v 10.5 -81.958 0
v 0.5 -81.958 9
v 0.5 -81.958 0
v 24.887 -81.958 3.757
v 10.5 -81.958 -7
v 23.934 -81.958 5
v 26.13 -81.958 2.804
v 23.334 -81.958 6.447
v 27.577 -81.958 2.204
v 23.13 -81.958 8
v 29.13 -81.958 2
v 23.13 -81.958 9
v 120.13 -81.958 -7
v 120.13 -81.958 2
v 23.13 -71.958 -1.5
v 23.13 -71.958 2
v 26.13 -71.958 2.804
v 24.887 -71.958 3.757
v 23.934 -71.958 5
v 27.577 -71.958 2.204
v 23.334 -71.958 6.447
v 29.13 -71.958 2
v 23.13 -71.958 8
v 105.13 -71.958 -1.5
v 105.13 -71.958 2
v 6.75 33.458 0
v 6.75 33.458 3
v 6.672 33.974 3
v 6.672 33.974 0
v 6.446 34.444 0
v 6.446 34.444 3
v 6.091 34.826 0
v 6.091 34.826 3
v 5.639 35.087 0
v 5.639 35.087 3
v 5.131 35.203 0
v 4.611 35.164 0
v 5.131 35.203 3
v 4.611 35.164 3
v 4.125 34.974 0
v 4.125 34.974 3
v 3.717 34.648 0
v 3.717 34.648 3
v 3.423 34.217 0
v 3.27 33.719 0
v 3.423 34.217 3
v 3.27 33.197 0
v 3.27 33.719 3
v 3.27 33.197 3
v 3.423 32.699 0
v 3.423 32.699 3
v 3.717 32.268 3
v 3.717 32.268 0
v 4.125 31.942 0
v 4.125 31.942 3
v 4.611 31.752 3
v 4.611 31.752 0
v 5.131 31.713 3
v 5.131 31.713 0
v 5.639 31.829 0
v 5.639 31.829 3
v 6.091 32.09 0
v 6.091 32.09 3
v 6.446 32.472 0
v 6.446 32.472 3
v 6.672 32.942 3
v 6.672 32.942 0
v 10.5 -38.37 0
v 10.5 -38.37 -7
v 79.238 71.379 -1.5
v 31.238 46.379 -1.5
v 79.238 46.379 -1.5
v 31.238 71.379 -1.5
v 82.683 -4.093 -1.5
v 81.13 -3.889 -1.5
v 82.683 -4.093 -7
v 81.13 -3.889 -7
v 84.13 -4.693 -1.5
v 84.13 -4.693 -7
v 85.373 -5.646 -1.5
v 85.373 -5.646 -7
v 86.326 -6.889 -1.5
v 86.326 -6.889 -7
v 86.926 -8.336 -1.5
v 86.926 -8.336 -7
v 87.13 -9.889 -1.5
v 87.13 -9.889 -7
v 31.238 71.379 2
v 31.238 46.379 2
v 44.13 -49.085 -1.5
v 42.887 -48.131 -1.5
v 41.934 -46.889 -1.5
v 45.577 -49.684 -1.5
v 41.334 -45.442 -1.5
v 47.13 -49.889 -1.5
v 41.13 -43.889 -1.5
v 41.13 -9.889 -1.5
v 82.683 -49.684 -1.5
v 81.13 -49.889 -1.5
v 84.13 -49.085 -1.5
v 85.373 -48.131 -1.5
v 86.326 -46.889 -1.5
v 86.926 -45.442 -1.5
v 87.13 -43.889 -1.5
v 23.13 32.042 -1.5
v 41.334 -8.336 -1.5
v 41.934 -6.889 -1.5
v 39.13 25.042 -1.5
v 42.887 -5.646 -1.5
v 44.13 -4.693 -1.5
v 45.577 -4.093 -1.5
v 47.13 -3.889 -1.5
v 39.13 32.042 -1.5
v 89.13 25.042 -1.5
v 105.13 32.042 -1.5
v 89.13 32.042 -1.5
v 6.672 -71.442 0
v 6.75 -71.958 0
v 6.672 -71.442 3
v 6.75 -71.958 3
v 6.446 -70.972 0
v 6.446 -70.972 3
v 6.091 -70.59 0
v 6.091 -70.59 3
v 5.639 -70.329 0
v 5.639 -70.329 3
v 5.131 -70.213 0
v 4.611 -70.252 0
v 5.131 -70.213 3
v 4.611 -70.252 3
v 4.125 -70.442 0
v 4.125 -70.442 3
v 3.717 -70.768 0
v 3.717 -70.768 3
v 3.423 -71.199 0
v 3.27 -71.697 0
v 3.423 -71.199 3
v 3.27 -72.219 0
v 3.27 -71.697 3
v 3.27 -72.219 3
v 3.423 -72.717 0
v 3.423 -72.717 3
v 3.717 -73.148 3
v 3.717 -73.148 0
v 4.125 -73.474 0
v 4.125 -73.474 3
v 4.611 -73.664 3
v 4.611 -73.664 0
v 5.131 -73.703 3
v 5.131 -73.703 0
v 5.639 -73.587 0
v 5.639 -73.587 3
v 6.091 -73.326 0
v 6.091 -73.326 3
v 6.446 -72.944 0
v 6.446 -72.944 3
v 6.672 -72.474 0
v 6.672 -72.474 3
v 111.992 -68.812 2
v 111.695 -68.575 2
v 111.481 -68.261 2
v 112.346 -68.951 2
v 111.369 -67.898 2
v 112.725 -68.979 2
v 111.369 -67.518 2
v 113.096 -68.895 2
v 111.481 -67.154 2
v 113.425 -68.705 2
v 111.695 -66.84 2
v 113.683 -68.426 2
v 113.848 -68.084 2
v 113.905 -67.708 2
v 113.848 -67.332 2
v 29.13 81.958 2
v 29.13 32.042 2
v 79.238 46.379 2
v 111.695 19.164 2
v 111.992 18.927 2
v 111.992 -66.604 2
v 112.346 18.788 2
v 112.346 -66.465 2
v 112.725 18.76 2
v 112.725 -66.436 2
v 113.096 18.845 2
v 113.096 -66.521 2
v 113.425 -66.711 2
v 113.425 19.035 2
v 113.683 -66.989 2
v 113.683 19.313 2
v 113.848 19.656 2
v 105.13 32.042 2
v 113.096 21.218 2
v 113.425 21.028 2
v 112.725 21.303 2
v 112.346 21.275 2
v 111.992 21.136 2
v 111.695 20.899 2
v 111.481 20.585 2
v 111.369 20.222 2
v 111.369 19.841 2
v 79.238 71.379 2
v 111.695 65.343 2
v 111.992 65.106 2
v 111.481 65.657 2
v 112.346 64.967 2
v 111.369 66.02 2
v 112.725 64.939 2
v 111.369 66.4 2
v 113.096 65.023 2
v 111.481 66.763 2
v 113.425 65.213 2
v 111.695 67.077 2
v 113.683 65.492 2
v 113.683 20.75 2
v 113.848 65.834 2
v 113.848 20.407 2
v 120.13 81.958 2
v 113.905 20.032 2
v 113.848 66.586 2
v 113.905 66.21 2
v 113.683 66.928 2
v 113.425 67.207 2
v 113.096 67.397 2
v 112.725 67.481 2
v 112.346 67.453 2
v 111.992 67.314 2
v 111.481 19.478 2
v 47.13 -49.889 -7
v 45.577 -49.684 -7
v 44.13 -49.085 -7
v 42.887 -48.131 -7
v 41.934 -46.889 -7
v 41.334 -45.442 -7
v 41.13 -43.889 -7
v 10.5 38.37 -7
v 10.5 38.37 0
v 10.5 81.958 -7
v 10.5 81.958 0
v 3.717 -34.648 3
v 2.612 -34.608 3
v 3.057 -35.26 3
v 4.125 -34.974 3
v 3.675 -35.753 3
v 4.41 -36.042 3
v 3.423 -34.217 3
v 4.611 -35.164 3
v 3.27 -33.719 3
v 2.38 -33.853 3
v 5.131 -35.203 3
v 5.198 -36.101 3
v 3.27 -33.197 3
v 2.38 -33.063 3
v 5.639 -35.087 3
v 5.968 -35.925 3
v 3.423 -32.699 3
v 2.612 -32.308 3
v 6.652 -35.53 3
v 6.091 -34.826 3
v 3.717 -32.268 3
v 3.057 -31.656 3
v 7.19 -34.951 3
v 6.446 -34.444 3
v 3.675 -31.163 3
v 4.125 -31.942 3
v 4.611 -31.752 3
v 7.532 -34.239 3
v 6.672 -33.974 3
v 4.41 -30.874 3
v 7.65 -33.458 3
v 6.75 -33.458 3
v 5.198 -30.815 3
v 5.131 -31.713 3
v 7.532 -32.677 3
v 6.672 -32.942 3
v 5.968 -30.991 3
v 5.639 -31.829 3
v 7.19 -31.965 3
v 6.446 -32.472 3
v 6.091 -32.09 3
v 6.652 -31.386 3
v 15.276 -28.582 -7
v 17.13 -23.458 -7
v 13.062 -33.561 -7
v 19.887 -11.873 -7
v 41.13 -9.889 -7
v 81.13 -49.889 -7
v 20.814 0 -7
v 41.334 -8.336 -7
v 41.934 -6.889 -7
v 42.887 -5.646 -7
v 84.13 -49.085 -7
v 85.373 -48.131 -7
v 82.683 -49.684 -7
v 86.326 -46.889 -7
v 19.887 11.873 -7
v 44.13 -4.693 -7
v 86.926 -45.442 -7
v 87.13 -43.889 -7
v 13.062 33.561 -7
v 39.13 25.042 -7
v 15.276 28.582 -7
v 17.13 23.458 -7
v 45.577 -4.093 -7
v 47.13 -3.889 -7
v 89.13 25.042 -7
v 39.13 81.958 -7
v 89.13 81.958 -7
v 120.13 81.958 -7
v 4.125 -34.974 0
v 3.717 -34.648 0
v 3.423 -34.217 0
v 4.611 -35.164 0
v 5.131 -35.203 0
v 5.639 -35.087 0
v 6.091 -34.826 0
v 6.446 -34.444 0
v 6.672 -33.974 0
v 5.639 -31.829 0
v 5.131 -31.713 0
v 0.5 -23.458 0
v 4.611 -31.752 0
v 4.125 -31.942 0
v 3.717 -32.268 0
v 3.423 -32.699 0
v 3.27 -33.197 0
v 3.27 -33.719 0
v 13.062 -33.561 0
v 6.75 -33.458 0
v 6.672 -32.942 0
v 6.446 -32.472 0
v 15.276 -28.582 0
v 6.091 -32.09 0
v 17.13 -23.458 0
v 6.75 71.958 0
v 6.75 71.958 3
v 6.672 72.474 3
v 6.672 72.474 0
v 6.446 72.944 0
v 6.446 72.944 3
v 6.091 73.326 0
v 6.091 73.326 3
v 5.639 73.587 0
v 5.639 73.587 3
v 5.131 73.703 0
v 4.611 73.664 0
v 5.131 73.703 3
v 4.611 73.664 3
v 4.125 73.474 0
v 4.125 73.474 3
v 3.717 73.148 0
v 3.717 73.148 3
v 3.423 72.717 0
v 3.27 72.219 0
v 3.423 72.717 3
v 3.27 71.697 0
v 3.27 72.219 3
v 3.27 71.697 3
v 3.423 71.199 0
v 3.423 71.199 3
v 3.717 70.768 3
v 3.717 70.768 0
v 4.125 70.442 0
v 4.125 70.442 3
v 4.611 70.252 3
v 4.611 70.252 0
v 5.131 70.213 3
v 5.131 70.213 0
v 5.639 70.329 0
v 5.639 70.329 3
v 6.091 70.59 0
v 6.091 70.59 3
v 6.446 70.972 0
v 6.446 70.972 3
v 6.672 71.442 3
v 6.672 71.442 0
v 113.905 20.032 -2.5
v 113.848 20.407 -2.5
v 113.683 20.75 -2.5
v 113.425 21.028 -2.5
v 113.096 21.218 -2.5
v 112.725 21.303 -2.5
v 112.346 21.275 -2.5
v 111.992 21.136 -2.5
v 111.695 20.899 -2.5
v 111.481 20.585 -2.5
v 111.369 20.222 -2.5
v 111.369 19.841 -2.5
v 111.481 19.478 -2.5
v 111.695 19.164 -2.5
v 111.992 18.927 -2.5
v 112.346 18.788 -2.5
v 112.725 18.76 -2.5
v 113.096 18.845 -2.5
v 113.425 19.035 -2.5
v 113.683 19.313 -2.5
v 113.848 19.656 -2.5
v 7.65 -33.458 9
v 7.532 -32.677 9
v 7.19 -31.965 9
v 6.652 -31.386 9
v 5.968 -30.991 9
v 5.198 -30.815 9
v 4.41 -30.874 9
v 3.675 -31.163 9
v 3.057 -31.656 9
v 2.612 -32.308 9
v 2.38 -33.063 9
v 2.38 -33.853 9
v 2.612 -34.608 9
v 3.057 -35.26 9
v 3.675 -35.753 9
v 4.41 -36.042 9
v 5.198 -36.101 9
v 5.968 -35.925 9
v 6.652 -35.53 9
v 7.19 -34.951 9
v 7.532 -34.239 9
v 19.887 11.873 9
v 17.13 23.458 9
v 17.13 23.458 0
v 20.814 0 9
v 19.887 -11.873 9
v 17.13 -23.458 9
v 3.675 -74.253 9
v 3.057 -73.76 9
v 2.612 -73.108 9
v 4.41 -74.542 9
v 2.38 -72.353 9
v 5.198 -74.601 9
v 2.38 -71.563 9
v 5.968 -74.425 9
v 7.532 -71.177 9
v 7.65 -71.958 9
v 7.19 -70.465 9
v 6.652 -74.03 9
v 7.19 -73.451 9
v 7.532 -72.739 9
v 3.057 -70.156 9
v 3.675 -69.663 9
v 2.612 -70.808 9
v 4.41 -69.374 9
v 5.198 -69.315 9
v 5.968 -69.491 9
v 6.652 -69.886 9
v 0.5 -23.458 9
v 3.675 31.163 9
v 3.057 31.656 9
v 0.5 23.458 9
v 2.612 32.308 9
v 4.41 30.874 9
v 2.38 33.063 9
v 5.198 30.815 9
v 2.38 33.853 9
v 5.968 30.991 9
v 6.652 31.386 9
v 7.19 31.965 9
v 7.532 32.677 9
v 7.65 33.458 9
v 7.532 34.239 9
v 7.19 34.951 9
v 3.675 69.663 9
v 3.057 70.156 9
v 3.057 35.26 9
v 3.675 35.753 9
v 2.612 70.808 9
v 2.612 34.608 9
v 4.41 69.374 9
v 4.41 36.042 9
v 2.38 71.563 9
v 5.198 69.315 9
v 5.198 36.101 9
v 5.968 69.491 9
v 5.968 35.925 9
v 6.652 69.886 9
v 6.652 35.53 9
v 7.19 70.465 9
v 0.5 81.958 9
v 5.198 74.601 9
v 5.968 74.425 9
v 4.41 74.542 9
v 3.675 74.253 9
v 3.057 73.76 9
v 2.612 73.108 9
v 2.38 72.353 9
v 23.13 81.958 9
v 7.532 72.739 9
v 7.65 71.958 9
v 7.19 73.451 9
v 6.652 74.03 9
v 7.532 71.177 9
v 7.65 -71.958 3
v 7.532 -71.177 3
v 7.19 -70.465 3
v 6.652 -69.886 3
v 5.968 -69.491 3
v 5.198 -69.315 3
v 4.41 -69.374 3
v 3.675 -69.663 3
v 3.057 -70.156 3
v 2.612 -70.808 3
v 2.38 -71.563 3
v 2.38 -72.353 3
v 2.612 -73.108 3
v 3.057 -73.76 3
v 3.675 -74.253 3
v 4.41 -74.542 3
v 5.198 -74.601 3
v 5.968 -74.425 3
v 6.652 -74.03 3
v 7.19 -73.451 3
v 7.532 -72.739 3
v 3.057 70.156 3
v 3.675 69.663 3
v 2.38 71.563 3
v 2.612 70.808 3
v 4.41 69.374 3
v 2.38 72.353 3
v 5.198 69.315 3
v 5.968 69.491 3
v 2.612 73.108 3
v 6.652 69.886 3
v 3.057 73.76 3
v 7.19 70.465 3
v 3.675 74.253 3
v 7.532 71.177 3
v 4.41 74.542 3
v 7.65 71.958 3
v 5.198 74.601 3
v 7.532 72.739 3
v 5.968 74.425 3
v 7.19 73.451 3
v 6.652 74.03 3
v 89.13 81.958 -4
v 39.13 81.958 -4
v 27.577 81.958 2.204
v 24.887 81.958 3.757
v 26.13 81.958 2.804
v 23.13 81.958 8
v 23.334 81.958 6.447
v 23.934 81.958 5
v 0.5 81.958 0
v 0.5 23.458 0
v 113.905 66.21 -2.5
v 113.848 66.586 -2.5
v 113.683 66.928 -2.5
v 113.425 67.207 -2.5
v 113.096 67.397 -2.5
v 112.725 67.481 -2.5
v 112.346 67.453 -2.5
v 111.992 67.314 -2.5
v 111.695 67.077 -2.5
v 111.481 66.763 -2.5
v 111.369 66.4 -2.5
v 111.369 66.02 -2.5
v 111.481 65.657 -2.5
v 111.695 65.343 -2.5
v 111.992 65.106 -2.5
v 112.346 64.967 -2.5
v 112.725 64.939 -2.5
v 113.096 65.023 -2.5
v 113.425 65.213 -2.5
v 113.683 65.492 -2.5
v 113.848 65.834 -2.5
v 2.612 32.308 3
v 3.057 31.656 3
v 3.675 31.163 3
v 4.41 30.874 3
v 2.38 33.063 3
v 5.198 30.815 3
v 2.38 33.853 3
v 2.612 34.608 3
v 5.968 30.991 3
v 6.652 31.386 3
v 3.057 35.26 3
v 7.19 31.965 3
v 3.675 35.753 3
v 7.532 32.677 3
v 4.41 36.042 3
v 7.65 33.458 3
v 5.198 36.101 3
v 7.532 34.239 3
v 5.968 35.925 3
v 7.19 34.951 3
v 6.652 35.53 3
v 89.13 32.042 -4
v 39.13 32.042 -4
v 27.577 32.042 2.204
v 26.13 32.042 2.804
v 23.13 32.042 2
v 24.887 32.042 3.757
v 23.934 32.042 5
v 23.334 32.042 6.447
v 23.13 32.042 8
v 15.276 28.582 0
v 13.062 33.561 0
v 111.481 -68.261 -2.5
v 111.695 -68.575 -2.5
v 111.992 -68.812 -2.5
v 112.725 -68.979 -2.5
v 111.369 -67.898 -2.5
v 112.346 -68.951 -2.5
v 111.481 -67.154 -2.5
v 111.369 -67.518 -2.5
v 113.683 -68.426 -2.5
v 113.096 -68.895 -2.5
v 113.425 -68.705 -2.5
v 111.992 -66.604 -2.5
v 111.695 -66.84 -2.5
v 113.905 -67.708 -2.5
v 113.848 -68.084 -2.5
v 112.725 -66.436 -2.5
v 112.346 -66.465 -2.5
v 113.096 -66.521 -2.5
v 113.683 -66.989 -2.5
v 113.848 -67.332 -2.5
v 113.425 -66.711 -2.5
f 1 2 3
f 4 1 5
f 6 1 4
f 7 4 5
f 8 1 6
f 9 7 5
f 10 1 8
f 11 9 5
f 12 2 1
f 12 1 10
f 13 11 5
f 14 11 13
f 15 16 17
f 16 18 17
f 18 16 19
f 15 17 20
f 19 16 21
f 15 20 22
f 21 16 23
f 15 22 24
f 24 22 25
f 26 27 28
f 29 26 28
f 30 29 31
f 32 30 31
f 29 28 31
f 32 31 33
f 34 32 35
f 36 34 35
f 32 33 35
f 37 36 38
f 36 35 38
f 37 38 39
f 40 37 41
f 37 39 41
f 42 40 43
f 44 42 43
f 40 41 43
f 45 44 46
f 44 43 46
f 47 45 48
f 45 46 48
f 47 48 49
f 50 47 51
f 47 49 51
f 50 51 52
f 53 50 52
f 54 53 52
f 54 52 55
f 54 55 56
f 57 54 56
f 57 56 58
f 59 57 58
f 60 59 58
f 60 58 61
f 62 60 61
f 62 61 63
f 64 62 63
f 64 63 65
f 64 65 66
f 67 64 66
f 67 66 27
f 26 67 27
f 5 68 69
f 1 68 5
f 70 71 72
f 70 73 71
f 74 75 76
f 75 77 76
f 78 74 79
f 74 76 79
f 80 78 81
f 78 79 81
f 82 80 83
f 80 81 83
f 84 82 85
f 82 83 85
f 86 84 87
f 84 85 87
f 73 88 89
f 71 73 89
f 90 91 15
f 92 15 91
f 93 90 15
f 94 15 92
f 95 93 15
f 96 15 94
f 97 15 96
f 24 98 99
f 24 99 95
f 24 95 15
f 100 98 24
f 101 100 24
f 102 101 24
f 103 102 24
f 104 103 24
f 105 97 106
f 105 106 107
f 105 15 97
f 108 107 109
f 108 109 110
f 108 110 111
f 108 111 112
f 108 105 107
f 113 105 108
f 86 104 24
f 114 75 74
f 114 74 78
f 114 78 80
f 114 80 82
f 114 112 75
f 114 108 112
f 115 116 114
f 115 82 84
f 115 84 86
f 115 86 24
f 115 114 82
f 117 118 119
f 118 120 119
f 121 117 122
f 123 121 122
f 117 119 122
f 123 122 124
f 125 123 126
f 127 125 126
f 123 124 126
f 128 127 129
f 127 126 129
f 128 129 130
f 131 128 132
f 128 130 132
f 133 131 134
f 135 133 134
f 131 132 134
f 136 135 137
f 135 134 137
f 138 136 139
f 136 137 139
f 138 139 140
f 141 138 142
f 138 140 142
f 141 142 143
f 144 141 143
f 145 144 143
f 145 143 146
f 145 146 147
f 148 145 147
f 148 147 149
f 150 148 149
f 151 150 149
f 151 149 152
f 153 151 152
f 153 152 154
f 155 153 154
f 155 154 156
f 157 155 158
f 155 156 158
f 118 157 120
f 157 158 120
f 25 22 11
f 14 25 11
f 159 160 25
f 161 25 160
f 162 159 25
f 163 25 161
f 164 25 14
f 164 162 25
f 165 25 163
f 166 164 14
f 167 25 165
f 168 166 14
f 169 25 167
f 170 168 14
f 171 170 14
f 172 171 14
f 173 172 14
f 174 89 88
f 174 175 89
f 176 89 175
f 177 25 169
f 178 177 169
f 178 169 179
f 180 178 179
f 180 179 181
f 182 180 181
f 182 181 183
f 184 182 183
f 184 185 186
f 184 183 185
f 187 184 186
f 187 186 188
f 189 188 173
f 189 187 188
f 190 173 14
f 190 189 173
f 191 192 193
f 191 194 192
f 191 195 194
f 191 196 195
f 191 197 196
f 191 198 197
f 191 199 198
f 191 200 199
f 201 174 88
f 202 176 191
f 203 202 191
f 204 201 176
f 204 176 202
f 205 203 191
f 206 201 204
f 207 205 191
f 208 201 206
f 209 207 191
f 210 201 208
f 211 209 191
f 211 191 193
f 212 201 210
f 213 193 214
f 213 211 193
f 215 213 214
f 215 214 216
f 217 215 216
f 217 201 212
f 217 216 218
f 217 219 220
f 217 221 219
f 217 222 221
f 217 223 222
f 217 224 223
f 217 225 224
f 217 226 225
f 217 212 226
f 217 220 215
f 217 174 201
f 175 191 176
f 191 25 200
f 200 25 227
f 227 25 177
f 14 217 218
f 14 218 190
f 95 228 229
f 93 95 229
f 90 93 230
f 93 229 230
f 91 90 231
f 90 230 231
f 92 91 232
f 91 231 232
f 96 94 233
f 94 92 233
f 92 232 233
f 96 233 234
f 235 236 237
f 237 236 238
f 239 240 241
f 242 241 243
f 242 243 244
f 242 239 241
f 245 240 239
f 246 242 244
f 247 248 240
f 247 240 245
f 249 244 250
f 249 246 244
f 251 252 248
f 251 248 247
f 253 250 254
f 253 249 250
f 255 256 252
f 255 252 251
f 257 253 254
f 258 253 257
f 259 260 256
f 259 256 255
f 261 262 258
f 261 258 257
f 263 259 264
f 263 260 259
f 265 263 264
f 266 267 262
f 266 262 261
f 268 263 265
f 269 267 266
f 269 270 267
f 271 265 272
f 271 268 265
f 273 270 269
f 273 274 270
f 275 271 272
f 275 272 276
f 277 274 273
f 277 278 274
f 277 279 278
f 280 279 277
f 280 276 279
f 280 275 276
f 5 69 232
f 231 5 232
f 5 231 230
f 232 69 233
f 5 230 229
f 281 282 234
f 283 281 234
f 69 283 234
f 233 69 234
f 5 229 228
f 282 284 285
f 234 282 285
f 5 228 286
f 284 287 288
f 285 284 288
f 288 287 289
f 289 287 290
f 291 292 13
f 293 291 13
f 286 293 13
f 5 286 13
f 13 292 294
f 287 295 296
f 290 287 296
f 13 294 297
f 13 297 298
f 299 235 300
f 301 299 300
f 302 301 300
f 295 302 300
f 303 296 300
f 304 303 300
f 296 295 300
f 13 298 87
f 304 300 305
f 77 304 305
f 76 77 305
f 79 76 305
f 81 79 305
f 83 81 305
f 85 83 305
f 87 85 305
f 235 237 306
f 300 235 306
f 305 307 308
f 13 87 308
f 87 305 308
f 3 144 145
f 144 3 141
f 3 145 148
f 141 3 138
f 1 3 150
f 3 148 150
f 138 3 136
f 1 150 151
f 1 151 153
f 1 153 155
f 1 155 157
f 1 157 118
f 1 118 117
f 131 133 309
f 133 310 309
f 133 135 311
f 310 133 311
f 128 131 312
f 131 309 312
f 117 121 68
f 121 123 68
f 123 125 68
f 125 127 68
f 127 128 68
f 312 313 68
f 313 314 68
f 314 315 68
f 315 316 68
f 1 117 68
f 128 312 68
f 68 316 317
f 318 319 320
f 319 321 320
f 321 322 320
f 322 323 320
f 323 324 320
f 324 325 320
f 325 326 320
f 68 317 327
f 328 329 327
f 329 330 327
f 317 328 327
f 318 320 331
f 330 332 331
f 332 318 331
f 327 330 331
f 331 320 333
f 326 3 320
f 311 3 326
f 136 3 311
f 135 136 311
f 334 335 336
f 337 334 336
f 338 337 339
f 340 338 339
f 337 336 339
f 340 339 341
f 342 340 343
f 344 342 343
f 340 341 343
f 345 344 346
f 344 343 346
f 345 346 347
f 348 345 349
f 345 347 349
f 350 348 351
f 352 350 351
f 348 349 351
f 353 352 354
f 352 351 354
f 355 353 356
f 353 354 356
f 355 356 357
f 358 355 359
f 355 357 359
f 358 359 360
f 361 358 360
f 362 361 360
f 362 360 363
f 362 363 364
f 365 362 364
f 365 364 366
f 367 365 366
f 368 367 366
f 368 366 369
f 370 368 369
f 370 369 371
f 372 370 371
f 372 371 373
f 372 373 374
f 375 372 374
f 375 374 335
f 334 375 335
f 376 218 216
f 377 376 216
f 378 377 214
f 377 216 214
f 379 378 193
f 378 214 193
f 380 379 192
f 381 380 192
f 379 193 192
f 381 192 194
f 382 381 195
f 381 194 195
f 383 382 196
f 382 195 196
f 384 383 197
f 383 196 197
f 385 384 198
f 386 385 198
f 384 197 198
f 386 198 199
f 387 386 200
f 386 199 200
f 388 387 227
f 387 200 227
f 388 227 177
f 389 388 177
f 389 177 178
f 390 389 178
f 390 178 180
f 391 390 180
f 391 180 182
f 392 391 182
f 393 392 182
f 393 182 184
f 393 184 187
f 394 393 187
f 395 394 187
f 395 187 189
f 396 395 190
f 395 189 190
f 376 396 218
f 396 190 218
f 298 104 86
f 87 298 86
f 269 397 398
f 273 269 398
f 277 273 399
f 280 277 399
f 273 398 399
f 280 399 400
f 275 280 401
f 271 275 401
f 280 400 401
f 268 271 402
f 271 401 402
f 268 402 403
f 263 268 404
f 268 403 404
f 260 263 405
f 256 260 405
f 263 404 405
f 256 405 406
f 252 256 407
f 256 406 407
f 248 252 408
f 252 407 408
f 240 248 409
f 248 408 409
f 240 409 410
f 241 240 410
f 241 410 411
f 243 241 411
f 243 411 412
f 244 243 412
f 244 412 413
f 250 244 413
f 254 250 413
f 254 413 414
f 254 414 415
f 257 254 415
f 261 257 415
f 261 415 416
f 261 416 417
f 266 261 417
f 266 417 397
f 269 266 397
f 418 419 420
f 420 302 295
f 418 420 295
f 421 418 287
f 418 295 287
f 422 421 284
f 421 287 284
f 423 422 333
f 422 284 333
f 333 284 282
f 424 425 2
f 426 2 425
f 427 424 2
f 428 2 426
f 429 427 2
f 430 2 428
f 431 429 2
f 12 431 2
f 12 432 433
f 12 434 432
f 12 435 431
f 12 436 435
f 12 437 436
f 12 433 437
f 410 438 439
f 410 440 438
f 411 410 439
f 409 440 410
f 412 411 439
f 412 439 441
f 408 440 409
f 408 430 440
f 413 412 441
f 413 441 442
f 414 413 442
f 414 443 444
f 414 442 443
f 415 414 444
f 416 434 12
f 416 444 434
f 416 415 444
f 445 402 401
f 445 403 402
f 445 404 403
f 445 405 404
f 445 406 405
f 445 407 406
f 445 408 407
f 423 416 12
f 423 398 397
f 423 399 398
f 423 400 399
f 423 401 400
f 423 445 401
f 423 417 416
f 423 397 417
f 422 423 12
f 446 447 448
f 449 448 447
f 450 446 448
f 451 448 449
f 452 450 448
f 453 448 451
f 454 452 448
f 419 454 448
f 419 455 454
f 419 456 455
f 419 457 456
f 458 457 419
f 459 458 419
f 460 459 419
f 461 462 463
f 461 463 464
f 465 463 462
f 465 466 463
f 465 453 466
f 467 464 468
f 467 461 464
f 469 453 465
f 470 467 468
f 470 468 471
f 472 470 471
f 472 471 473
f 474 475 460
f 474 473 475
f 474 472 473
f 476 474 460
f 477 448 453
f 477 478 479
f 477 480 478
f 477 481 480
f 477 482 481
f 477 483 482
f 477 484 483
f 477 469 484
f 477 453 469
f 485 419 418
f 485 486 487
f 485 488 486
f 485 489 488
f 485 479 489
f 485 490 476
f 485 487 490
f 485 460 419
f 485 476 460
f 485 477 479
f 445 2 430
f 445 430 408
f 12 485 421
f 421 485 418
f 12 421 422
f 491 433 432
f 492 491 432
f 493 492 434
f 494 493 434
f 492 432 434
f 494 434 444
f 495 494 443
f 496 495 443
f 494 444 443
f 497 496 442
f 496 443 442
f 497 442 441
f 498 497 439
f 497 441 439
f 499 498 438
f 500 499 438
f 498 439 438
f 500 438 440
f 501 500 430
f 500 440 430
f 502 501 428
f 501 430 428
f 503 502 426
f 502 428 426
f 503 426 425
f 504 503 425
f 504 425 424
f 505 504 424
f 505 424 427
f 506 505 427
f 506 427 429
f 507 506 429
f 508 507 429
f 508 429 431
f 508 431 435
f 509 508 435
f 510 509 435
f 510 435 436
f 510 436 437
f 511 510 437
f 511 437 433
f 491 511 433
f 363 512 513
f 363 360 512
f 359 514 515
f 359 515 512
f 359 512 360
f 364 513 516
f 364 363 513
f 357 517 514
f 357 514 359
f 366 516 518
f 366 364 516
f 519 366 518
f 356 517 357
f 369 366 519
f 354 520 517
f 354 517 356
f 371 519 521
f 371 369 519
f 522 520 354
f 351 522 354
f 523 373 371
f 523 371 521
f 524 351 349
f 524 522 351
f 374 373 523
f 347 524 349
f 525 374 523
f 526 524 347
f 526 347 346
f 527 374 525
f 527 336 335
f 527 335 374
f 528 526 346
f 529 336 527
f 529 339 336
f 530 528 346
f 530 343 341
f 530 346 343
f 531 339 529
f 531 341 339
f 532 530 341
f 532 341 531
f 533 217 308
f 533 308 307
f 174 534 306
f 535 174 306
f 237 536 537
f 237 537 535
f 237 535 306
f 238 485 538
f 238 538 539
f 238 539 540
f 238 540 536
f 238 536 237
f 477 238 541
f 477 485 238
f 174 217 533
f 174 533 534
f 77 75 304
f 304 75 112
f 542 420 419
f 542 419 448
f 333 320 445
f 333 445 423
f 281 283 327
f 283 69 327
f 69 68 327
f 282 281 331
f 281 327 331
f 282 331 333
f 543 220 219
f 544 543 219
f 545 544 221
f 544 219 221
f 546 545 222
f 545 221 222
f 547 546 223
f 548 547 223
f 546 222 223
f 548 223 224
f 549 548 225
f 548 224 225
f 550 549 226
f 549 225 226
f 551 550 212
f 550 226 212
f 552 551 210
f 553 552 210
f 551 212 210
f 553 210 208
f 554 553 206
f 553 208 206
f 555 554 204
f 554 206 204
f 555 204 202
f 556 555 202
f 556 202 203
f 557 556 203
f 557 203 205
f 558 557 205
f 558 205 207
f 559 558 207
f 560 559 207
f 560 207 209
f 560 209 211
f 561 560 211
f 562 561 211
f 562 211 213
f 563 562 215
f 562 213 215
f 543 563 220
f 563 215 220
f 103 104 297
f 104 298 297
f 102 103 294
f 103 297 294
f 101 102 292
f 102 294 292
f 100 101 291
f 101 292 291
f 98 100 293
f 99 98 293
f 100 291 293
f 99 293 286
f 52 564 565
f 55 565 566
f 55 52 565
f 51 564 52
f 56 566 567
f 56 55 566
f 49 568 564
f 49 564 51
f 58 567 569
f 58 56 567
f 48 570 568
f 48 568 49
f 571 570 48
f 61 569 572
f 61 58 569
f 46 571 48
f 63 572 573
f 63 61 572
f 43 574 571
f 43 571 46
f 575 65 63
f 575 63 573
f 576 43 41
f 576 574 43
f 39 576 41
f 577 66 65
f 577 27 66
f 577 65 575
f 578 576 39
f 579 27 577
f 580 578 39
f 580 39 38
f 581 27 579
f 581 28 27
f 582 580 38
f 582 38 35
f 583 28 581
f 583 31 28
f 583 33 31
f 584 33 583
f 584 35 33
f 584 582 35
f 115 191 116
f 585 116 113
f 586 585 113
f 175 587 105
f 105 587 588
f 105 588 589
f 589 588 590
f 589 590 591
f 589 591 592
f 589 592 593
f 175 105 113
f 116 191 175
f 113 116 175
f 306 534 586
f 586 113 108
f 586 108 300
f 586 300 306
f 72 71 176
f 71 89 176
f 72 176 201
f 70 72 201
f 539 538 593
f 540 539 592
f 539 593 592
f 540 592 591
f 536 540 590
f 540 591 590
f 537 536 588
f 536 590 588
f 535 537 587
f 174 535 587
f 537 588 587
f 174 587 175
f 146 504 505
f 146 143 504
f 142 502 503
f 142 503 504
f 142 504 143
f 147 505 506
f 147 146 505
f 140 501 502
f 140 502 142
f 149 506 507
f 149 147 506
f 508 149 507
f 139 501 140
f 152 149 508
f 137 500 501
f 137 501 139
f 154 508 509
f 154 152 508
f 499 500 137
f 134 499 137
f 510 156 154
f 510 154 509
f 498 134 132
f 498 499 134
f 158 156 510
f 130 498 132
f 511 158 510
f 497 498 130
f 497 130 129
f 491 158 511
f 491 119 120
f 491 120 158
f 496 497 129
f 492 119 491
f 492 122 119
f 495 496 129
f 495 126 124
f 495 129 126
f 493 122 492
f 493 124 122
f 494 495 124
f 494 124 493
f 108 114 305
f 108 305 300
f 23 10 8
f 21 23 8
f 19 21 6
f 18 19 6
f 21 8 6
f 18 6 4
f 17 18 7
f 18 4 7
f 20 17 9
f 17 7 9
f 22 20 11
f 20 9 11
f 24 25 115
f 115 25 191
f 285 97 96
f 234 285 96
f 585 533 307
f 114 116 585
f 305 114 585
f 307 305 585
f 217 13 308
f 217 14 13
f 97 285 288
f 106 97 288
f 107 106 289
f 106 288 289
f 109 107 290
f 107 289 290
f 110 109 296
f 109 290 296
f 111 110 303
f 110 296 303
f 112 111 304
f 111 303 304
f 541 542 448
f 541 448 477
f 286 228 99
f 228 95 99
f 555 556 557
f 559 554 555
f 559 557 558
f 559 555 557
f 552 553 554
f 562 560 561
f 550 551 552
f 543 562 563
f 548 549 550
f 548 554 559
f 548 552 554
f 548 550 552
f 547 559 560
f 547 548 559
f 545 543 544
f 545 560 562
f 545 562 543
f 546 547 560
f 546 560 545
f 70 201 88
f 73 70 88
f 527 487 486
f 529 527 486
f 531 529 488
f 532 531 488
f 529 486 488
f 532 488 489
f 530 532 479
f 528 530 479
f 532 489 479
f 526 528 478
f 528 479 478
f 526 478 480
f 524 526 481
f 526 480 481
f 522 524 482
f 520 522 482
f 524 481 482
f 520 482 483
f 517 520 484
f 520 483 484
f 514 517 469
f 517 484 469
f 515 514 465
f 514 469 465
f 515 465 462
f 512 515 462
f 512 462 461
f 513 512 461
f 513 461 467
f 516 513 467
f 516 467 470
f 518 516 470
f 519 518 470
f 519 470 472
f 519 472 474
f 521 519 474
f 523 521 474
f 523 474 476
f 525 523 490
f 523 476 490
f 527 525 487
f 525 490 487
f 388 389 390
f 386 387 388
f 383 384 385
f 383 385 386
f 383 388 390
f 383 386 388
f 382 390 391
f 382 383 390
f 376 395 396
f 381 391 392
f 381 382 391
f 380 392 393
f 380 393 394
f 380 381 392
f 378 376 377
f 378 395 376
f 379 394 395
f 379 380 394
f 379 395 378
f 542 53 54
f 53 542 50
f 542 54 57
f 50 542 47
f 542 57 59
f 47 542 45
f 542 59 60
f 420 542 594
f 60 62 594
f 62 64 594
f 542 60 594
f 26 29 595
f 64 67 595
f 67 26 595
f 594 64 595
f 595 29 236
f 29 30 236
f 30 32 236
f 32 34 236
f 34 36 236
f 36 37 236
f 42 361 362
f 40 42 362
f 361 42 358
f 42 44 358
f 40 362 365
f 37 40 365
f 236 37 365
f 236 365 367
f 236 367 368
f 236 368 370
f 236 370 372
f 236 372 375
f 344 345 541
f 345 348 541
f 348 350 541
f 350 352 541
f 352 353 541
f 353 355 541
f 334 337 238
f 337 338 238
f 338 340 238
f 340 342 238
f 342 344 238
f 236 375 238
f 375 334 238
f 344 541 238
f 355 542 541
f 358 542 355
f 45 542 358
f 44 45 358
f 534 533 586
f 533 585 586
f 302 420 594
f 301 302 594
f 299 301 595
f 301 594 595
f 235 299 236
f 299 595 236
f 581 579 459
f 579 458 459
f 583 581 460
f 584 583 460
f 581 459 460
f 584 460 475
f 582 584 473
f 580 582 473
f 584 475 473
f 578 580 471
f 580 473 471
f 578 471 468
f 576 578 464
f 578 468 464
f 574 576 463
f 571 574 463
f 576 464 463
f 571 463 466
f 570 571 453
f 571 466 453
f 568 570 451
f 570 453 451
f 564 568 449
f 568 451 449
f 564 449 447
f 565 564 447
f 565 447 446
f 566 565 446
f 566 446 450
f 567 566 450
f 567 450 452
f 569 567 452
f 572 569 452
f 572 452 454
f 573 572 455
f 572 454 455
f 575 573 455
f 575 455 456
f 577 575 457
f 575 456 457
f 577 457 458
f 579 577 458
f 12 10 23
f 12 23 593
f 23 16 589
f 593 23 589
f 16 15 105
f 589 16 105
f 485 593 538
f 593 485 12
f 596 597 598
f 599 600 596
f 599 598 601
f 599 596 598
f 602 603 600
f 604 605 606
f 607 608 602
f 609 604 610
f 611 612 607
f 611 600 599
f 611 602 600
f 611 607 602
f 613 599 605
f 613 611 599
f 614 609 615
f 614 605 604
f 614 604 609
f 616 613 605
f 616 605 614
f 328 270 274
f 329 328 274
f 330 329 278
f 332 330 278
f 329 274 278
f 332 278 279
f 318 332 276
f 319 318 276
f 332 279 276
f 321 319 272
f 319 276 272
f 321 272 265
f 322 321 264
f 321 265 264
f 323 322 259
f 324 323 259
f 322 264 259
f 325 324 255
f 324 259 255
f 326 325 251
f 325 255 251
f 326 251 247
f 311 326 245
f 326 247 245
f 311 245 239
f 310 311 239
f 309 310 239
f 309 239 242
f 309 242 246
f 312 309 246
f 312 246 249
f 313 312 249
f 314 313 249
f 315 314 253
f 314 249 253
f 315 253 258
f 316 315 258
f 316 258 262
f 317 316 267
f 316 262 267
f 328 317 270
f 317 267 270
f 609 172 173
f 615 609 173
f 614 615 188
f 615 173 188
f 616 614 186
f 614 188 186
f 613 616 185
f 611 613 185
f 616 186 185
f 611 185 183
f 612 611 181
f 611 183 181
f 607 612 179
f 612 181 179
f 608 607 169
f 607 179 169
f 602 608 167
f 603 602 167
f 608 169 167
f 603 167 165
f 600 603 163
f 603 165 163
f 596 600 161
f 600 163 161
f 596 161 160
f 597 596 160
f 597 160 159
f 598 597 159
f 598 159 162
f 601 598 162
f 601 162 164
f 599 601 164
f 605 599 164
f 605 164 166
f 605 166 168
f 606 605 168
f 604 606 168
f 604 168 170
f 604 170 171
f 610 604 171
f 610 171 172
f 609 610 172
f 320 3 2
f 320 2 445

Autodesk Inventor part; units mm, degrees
ref_plane "YZ Plane" through (0, 0, 0) normal (1, 0, 0) x (0, 1, 0)
ref_plane "XZ Plane" through (0, 0, 0) normal (0, 1, 0) x (-1, 0, 0)
ref_plane "XY Plane" through (0, 0, 0) normal (0, 0, 1) x (1, 0, 0)
sketch "Sketch1" plane through (0, 0, 0) normal (0, 0, 1) x (1, 0, 0)
  line L0 (0, 0) -> (0, 22.958) construction
  line L1 (0, 0) -> (0, -22.958) construction
  line L2 (0, -22.958) -> (16.63, -22.958) construction
  line L3 (16.63, -22.958) -> (16.63, -81.958) construction
  line L4 (16.63, -81.958) -> (0, -81.958) construction
  line L5 (0, -81.958) -> (0, -22.958) construction
  line L6 (0, 22.958) -> (16.63, 22.958) construction
  line L7 (16.63, 22.958) -> (16.63, 81.958) construction
  line L8 (16.63, 81.958) -> (0, 81.958) construction
  line L9 (0, 81.958) -> (0, 22.958) construction
  line L10 (0, -52.458) -> (0.5, -52.458) construction
  line L11 (8.315, -22.958) -> (8.315, -23.458) construction
  line L12 (0, 0) -> (-53.686, 0) construction
  circle A0 centre (-53.686, 0) radius 74 construction
  line L13 (20.314, 0) -> (20.814, 0) construction
  line L14 (16.63, -22.958) -> (17.13, -22.958) construction
  line L15 (16.63, 22.958) -> (17.13, 22.958) construction
  line L16 (0.5, -23.458) -> (17.13, -23.458)
  line L17 (17.13, -23.458) -> (17.13, -81.958)
  line L18 (17.13, -81.958) -> (0.5, -81.958)
  line L19 (0.5, -81.958) -> (0.5, -23.458)
  line L20 (8.315, 22.958) -> (8.315, 23.458) construction
  line L21 (0.5, 81.958) -> (17.13, 81.958)
  line L22 (17.13, 81.958) -> (17.13, 23.458)
  line L23 (17.13, 23.458) -> (0.5, 23.458)
  line L24 (0.5, 23.458) -> (0.5, 81.958)
  arc A1 (17.13, -23.458) -> (17.13, 23.458) centre (-55.7128, 0) ccw
  line L25 (17.13, -81.958) -> (23.13, -81.958)
  line L26 (23.13, -81.958) -> (23.13, 81.958)
  line L27 (23.13, 81.958) -> (17.13, 81.958)
  dimension "d8" = 148
  dimension "d0" = 22.958
  dimension "d1" = 22.958
  dimension "d2" = 16.63
  dimension "d3" = 59
  dimension "d5" = 0.5
  dimension "d6" = 0.5
  dimension "d7" = 53.686
  dimension "d9" = 0.5
  dimension "d10" = 0.5
  dimension "d11" = 0.5
  dimension "d13" = 0.5
  dimension "d14" = 6
extrude "Extrusion1" add sketch "Sketch1" along normal blind 9
sketch "Sketch2" plane through (0, 0, 0) normal (0, 0, -1) x (-1, 0, 0)
  line L0 (-16.63, 22.958) -> (-16.63, 81.958) construction
  circle A0 centre (53.686, 0) radius 74 construction
  line L1 (-16.63, -22.958) -> (-16.63, -81.958) construction
  line L2 (-0.5, 23.458) -> (-17.13, 23.458) projected
  line L3 (-16.63, 23.458) -> (-16.63, 81.958)
  line L4 (-23.13, 81.958) -> (-0.5, 81.958) projected
  line L5 (-17.13, -23.458) -> (-0.5, -23.458) projected
  line L6 (-16.63, -23.458) -> (-16.63, -81.958)
  line L7 (-0.5, -81.958) -> (-23.13, -81.958) projected
  arc A1 (-17.13, 23.458) -> (-17.13, -23.458) centre (55.7128, 0) ccw projected
  arc A2 (-17.13, 23.458) -> (-17.13, -23.458) centre (55.7128, 0) ccw
  line L8 (-23.13, 81.958) -> (-110.13, 81.958)
  line L9 (-110.13, 81.958) -> (-110.13, -81.958)
  line L10 (-110.13, -81.958) -> (-23.13, -81.958)
  line L11 (-23.13, -81.958) -> (-23.13, 81.958)
  line L12 (0, 0) -> (-10.5, 0) construction
  line L13 (-0.5, -81.958) -> (-23.13, -81.958) projected
  arc A3 (-10.5, 38.3695) -> (-10.5, -38.3695) centre (55.7128, 0) ccw
  line L14 (-10.5, 38.3695) -> (-10.5, 81.958)
  line L15 (-10.5, -38.3695) -> (-10.5, -81.958)
  point P0 (-10, 81.958)
  dimension "d17" = 87
  dimension "d66" = 10.5
extrude "Extrusion2" add sketch "Sketch2" along normal blind 7 and the other way blind 2 contours A1 A3 L6 L7 L11 L4 L3 | L3 L4 L14 A3 | A3 L15 L7 L6 | L11 L10 L9 L8
sketch "Sketch3" plane through (0, 0, 9) normal (0, 0, 1) x (1, 0, 0)
  line L0 (0.5, -81.958) -> (23.13, -81.958) construction
  line L1 (0, -23.458) -> (10, -23.458) construction
  line L2 (10, -23.458) -> (10, -81.958) construction
  line L3 (10, -81.958) -> (0, -81.958) construction
  line L4 (0, -81.958) -> (0, -23.458) construction
  line L5 (0, 23.458) -> (10, 23.458) construction
  line L6 (0, 81.958) -> (0, 23.458) construction
  line L7 (5, -81.958) -> (5, -71.958) construction
  line L8 (17.13, -23.458) -> (0.5, -23.458) construction
  line L9 (5, -23.458) -> (5, -33.458) construction
  line L10 (5, -23.458) -> (15, -23.458) construction
  circle A0 centre (5, -71.958) radius 1.75
  circle A1 centre (5, -33.458) radius 1.75
  line L11 (-21.548, 0) -> (41.2165, 0) construction
  circle A2 centre (5, 71.958) radius 1.75
  circle A3 centre (5, 33.458) radius 1.75
  point P0 (0, 0)
  dimension "d20" = 10
  dimension "d21" = 10
  dimension "d22" = 10
  dimension "d24" = 3.5
  dimension "d25" = 3.5
extrude "Extrusion3" cut sketch "Sketch3" against normal up to surface (9 mm away)
sketch "Sketch4" plane through (0, 0, 9) normal (0, 0, 1) x (1, 0, 0)
  circle A0 centre (5, -71.958) radius 1.75 projected
  circle A1 centre (5, -71.958) radius 2.65
  circle A2 centre (5, -33.458) radius 1.75 projected
  circle A3 centre (5, -33.458) radius 2.65
  circle A4 centre (5, 33.458) radius 1.75 projected
  circle A5 centre (5, 33.458) radius 2.65
  circle A6 centre (5, 71.958) radius 1.75 projected
  circle A7 centre (5, 71.958) radius 2.65
  point P0 (0, 0)
  dimension "d28" = 5.3
  dimension "d29" = 5.3
extrude "Extrusion4" cut sketch "Sketch4" against normal blind 6 contours A0 | A1 | A2 | A3 | A4 | A5 | A6 | A7
sketch "Sketch5" plane through (0, 0, 2) normal (0, 0, 1) x (1, 0, 0)
  line L0 (23.13, -71.958) -> (105.13, -71.958)
  line L1 (105.13, -71.958) -> (105.13, 32.042)
  line L2 (105.13, 32.042) -> (23.13, 32.042)
  line L3 (23.13, 32.042) -> (23.13, -71.958)
  line L4 (31.2383, 46.3792) -> (79.2383, 46.3792)
  line L5 (79.2383, 46.3792) -> (79.2383, 71.3792)
  line L6 (79.2383, 71.3792) -> (31.2383, 71.3792)
  line L7 (31.2383, 71.3792) -> (31.2383, 46.3792)
  line L8 (23.13, -81.958) -> (23.13, 81.958) construction
  line L9 (23.13, -81.958) -> (23.13, 81.958) construction
  line L10 (23.13, -81.958) -> (23.13, -71.958) construction
  point P0 (0, 0)
  dimension "d34" = 82
  dimension "d35" = 104
  dimension "d36" = 48
  dimension "d37" = 25
  dimension "d38" = 10
extrude "Extrusion5" cut sketch "Sketch5" against normal blind 3.5
sketch "Sketch6" plane through (0, 0, 2) normal (0, 0, 1) x (1, 0, 0)
  line L0 (23.13, 32.042) -> (105.13, 32.042) projected
  line L1 (64.13, 32.042) -> (39.13, 32.042)
  line L2 (64.13, 32.042) -> (89.13, 32.042)
  line L3 (89.13, 32.042) -> (89.13, 25.042)
  line L4 (89.13, 25.042) -> (39.13, 25.042)
  line L5 (39.13, 25.042) -> (39.13, 32.042)
  point P0 (0, 0)
  dimension "d41" = 25
  dimension "d42" = 25
  dimension "d43" = 7
extrude "Extrusion6" cut sketch "Sketch6" against normal up to surface (9 mm away)
sketch "Sketch7" plane through (23.13, 32.042, 2) normal (0, -1, 0) x (1, 0, 0)
  line L0 (66, -9) -> (16, -9) projected
  line L1 (66, -3.5) -> (66, -9) projected
  line L2 (16, -9) -> (66, -9)
  line L3 (66, -9) -> (66, -6)
  line L4 (66, -6) -> (16, -6)
  line L5 (16, -6) -> (16, -9)
  point P0 (-23.13, -2)
  dimension "d46" = 3
extrude "Extrusion7" cut sketch "Sketch7" against normal up to surface (49.916 mm away)
sketch "Sketch8" plane through (0, 0, -1.5) normal (0, 0, 1) x (1, 0, 0)
  line L0 (41.13, -49.8888) -> (87.13, -49.8888)
  line L1 (87.13, -49.8888) -> (87.13, -3.8888)
  line L2 (87.13, -3.8888) -> (41.13, -3.8888)
  line L3 (41.13, -3.8888) -> (41.13, -49.8888)
  line L4 (41.13, -49.8888) -> (87.13, -3.8888) construction
  line L5 (87.13, -49.8888) -> (41.13, -3.8888) construction
  point P0 (0, 0)
  point P1 (64.13, -26.8888)
  dimension "d49" = 46
  dimension "d50" = 46
extrude "Extrusion8" cut sketch "Sketch8" against normal up to surface (5.5 mm away)
sketch "Sketch9" plane through (0, 0, 2) normal (0, 0, 1) x (1, 0, 0)
  line L0 (110.13, 81.958) -> (110.13, -81.958) projected
  line L1 (110.13, -81.958) -> (120.13, -81.958)
  line L2 (120.13, -81.958) -> (120.13, 81.958)
  line L3 (120.13, 81.958) -> (110.13, 81.958)
  line L4 (110.13, 81.958) -> (110.13, -81.958)
  point P0 (0, 0)
  dimension "d53" = 10
extrude "Extrusion9" add sketch "Sketch9" against normal blind 9
sketch "Sketch10" plane through (0, 0, 2) normal (0, 0, 1) x (1, 0, 0)
  line L0 (105.13, 32.042) -> (105.13, -71.958) construction
  line L1 (105.13, -71.958) -> (120.13, -71.958) construction
  line L2 (120.13, -81.958) -> (120.13, 81.958) construction
  circle A0 centre (112.63, -67.7077) radius 1.275
  circle A1 centre (112.63, 66.21) radius 1.275
  circle A2 centre (112.63, 20.0315) radius 1.275
  line L3 (23.13, -81.958) -> (120.13, -81.958) construction
  line L4 (112.63, 66.21) -> (112.63, 81.958) construction
  line L5 (89.13, 81.958) -> (120.13, 81.958) construction
  line L6 (112.63, 66.21) -> (112.63, 20.0315) construction
  line L7 (112.63, -67.7077) -> (112.63, -81.958) construction
  point P0 (0, 0)
  dimension "d56" = 2.55
  dimension "d57" = 2.55
  dimension "d58" = 2.55
  dimension "d60" = 15.748
  dimension "d61" = 46.1785
  dimension "d62" = 14.2503
extrude "Extrusion10" cut sketch "Sketch10" against normal blind 4.5
fillet "Fillet1" radius 6 6 edges at (41.13, -49.8888, -4.25) (41.13, -3.8888, -4.25) (87.13, -3.8888, -4.25) (87.13, -49.8888, -4.25) (23.13, -76.958, 2) (23.13, 57, 2)
properties part number "Base Extension 1"
